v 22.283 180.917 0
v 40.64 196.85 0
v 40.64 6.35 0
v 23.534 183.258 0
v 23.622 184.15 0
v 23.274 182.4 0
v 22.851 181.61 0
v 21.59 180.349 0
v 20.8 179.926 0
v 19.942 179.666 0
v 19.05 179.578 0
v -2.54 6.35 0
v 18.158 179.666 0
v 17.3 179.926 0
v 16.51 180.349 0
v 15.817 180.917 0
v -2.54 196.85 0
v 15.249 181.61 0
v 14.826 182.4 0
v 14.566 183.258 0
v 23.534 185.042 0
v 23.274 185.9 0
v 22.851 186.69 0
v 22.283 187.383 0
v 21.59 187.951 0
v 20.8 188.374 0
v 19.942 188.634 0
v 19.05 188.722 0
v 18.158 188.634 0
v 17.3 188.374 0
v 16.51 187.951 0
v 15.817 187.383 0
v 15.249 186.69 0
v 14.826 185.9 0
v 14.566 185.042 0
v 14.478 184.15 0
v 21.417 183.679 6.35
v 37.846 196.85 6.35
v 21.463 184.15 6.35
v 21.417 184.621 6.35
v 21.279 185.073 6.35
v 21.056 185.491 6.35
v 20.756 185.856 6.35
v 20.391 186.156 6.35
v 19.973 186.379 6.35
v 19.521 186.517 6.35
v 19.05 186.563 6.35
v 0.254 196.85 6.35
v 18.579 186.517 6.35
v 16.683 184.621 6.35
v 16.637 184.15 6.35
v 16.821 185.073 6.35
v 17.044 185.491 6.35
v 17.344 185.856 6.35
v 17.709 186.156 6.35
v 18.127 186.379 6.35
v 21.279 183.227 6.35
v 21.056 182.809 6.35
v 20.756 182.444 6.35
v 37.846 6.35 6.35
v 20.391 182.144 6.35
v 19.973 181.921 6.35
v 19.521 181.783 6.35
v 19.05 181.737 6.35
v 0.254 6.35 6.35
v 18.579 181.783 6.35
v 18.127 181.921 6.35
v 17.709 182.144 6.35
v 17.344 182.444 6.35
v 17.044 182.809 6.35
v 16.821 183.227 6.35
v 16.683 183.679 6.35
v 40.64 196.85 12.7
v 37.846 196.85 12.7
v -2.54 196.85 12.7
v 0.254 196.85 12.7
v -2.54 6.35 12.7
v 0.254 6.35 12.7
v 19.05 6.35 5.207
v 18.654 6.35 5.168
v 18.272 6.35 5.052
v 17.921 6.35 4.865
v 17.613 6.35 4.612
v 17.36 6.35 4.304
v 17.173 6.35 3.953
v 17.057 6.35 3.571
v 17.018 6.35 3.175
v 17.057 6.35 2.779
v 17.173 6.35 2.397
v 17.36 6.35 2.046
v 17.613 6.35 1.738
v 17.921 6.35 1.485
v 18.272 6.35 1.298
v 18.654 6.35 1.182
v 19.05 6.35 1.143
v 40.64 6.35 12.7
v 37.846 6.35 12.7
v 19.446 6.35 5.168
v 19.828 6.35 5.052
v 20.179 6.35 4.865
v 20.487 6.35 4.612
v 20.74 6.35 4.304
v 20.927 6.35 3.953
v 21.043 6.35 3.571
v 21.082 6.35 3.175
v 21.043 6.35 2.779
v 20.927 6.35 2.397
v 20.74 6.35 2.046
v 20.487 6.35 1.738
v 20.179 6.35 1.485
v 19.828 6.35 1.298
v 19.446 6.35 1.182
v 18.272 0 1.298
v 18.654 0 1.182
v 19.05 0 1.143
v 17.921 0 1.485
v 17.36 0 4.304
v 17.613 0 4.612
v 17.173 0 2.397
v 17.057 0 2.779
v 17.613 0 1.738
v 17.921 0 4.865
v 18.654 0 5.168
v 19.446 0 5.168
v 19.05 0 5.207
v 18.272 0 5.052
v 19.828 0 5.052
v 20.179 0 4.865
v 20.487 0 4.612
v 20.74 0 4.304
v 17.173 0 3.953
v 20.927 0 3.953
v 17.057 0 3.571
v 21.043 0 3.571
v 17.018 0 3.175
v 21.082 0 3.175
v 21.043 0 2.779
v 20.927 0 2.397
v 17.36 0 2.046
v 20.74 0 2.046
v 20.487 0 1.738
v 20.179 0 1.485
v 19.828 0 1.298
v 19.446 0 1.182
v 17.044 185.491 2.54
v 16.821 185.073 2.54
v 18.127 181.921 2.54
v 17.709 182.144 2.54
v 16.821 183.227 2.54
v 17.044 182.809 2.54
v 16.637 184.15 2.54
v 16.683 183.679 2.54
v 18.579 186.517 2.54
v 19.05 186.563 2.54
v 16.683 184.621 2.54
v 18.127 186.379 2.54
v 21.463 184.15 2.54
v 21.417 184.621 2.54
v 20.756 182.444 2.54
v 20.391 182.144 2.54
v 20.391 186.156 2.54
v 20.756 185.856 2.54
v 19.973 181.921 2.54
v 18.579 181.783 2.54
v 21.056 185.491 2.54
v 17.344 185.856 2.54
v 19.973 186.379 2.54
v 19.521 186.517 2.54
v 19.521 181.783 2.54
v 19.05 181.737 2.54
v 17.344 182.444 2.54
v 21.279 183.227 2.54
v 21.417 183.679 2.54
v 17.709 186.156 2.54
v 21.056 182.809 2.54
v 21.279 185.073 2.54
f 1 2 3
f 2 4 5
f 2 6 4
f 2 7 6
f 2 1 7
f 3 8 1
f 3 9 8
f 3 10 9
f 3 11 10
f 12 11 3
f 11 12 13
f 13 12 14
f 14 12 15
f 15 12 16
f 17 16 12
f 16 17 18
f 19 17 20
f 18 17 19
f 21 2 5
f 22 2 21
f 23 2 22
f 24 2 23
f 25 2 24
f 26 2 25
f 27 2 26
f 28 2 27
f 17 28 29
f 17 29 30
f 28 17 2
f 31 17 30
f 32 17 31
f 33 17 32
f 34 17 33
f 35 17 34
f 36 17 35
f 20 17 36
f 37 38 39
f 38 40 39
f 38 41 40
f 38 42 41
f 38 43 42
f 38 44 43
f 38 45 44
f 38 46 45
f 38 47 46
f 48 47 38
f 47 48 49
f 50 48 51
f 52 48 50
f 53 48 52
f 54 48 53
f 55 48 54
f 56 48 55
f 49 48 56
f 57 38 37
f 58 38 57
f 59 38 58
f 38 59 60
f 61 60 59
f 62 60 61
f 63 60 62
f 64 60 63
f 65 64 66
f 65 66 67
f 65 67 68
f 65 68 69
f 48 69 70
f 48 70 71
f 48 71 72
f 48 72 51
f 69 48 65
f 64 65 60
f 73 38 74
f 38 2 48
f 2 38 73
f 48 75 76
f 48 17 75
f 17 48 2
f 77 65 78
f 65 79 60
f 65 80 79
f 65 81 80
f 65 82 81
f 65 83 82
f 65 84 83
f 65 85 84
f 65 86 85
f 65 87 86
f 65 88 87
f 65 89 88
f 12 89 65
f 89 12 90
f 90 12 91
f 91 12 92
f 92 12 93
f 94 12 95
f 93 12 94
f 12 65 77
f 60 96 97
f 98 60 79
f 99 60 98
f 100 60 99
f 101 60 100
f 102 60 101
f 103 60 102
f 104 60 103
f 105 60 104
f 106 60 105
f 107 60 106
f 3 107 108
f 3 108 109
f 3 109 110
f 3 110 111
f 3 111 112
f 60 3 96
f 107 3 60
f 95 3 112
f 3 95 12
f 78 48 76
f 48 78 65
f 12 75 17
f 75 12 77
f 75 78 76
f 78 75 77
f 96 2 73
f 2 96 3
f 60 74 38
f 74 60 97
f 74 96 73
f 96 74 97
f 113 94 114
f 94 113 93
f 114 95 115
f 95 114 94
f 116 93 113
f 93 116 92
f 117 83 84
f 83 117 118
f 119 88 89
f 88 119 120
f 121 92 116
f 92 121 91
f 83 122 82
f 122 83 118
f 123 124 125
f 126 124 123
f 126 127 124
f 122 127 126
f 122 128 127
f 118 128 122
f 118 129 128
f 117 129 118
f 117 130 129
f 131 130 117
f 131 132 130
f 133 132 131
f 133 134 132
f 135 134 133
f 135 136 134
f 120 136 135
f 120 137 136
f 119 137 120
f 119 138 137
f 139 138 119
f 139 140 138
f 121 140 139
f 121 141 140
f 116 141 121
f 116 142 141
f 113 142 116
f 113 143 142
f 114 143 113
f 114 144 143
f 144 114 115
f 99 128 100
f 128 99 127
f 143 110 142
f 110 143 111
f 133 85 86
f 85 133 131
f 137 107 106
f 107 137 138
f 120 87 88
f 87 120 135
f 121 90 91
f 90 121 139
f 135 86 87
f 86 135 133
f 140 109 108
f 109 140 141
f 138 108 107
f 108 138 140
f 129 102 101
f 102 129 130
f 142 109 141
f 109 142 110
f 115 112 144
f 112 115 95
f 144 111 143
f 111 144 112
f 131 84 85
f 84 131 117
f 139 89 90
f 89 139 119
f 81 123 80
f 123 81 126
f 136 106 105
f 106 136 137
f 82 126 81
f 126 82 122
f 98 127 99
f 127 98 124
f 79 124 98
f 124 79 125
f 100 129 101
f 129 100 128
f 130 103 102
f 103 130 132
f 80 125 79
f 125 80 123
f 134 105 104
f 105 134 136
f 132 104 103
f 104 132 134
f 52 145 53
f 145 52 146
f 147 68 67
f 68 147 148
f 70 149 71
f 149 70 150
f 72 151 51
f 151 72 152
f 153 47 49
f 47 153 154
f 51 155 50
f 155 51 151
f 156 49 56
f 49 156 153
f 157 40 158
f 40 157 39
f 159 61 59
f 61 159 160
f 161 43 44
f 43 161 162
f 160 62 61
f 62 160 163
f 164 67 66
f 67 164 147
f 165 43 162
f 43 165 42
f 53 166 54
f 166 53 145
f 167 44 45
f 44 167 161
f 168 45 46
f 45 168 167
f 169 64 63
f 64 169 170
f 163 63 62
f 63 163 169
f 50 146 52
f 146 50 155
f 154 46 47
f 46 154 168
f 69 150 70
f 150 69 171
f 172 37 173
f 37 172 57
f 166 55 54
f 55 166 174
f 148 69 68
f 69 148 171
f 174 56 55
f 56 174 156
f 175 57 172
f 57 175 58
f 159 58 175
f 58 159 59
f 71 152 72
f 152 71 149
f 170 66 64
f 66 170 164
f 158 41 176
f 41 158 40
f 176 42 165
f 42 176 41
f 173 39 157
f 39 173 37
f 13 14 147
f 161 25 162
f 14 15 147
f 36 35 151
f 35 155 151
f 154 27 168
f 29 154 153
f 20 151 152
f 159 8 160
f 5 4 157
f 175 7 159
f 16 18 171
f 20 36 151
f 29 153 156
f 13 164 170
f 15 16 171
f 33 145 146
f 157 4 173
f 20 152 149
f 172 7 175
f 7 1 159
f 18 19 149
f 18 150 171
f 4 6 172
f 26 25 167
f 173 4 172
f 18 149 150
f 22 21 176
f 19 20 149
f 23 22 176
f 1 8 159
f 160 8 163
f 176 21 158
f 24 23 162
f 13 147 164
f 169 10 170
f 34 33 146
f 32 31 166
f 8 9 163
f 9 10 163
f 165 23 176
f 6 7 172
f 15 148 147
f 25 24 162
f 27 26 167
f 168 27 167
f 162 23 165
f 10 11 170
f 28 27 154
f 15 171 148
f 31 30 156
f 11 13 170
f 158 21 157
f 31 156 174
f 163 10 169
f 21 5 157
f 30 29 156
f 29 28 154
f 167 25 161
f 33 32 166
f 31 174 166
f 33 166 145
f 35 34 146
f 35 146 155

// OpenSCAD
// file: _cat_door_u_liner_lib.scad
// Cat door U-shaped liner - shared geometry.
// Fits into a rectangular box cut into a door, lining the bottom and
// two sides with a thin wall so a smaller insert seats snugly in the gap.
//
// Flanges at the front and/or back cap the ends, sitting flush against
// the door's face and overlapping the cut edge to hide it.
//
// PRINTABILITY: a single piece with a 90-degree bend (leg+rail) can't be
// oriented to avoid supports, because the leg's flange overhang needs
// rotation about one axis while the rail's needs rotation about the other.
// So the part is split into 3 straight pieces - left leg, right leg, and
// the full-width bottom rail - each printable with zero overhangs, joined
// with a peg-and-hole press fit at the two corners. The rail (10.5in =
// 266.7mm) is also individually longer than a 256mm bed, so it's printed
// at a 45-degree diagonal, which brings its footprint to ~219x219mm.
//
// See cat_door_u_liner_leg_left.scad / _leg_right.scad / _rail.scad, which
// include this file and call the render_*() entry points. This file has no
// directly renderable geometry of its own (build_stl.py skips files
// starting with "_").

// ---- Parameters (inches) ----
door_depth      = 1.5;   // door thickness (liner spans this, Z)
box_width       = 10.5;  // width of the cutout in the door (X)
box_height      = 7.75;  // height of the cutout in the door (Y)
wall            = 0.25;  // thickness of the liner material (the gap it fills)

flange_front    = true;  // add a flange on the front face
flange_back     = true;  // add a flange on the back face
flange_overlap  = 0.25;  // how far the flange extends past the cut edge
flange_thick    = 0.1;   // flange thickness (Z), kept small/low-profile

screw_holes     = true;  // add mounting screw holes through the two legs
screw_hole_dia  = 0.19;  // clearance diameter for the screw shank (~#8 screw)
screw_hole_inset = 0.5;  // distance in from the tip (open end) of each leg

countersink       = true; // recess for a flat/flush screw head, on the inner face
countersink_dia   = 0.36; // head diameter (~#8 flat-head screw)
countersink_depth = 0.1;  // how deep the taper cuts into the leg (< wall)

// Corner joint: a round peg on each leg presses into a hole in the rail.
// The peg runs along the leg's own length, so it's a horizontal, in-plane
// extension of the print (no added overhang) rather than a feature that
// has to stick straight up off the bed. hole is slightly smaller than the
// peg for a firm friction/snap fit - sand the peg or reprint with
// adjusted diameters if it's too tight/loose.
joint_peg_dia   = 0.16;
joint_hole_dia  = 0.15;
joint_peg_height = 0.25;
joint_hole_depth = 0.32;

rail_print_angle = 45; // diagonal rotation so the rail fits a 256mm bed

eps = 0.01; // small overlap so parts fuse into one solid in unions

// ---- Shared sub-features ----

// Horizontal screw hole through one leg only (not the flange), so a screw
// bites into the solid door beside the cutout. Bored outward through the
// leg's outer face (x_start), centered on the leg's depth (Z), clear of
// the flanges which only occupy the ends of the Z range.
module screw_hole_leg(x_start, y_pos) {
    translate([x_start - eps, y_pos, door_depth / 2])
        rotate([0, 90, 0])
            cylinder(h = wall + 2 * eps, d = screw_hole_dia, $fn = 32);
}

// Countersink taper on the inner face (box-interior side) of a leg, where
// the screw head seats. dir = -1 for the left leg (inner face is the leg's
// high-x side, cone narrows toward -x); dir = +1 for the right leg (inner
// face is the low-x side, cone narrows toward +x).
module countersink_leg(x_face, y_pos, dir) {
    d1 = (dir < 0) ? screw_hole_dia : countersink_dia;
    d2 = (dir < 0) ? countersink_dia : screw_hole_dia;
    x0 = (dir < 0) ? x_face - countersink_depth : x_face;
    translate([x0, y_pos, door_depth / 2])
        rotate([0, 90, 0])
            cylinder(h = countersink_depth, d1 = d1, d2 = d2, $fn = 32);
}

// ---- Leg (a straight bar; the rail owns the corner squares, so a leg's
// own Y range starts at "wall", not 0) ----
// Built for the left side; the right leg is this shape mirrored about the
// box's centerline, which correctly flips the screw hole/countersink too.
module leg_shape(dir) {
    if (dir > 0) {
        translate([box_width, 0, 0]) mirror([1, 0, 0]) leg_shape(-1);
    } else {
        y0 = wall;
        y1 = box_height;
        h = y1 - y0;
        difference() {
            union() {
                translate([0, y0, 0]) cube([wall, h, door_depth]);
                if (flange_front)
                    translate([-flange_overlap, y0, -flange_thick])
                        cube([wall + flange_overlap, h, flange_thick + eps]);
                if (flange_back)
                    translate([-flange_overlap, y0, door_depth - eps])
                        cube([wall + flange_overlap, h, flange_thick + eps]);

                // Peg extending off the bottom face, into the rail's mortise
                translate([wall / 2, y0 - joint_peg_height, door_depth / 2])
                    rotate([-90, 0, 0])
                        cylinder(h = joint_peg_height + eps, d = joint_peg_dia, $fn = 32);
            }

            if (screw_holes) {
                y_pos = box_height - screw_hole_inset;
                screw_hole_leg(0, y_pos);
                if (countersink) countersink_leg(wall, y_pos, -1);
            }
        }
    }
}

// ---- Rail (full width; owns both bottom corner squares plus a mortise
// hole at each end that receives the matching leg's peg) ----
module rail_hole_at(x) {
    translate([x, wall - joint_hole_depth, door_depth / 2])
        rotate([-90, 0, 0])
            cylinder(h = joint_hole_depth + eps, d = joint_hole_dia, $fn = 32);
}

module rail_shape() {
    difference() {
        union() {
            cube([box_width, wall, door_depth]);
            if (flange_front)
                translate([-flange_overlap, -flange_overlap, -flange_thick])
                    cube([box_width + 2 * flange_overlap, wall + flange_overlap, flange_thick + eps]);
            if (flange_back)
                translate([-flange_overlap, -flange_overlap, door_depth - eps])
                    cube([box_width + 2 * flange_overlap, wall + flange_overlap, flange_thick + eps]);
        }

        rail_hole_at(wall / 2);
        rail_hole_at(box_width - wall / 2);
    }
}

// ---- Print-orientation wrappers ----
// Each piece is rotated so its "spine" (the inner face shared with the box
// opening) sits on the bed and the flange tips are at the top - going up,
// the cross-section only ever shrinks, so nothing overhangs and no
// supports are needed.
mm_per_inch = 25.4;

// The left and right legs are the same physical part: the flanges are
// front/back symmetric and the screw hole/countersink are centered on that
// same axis, so a 180-degree flip about the leg's own length swaps "left"
// for "right". One file, printed twice - flip one copy end-for-end when
// installing it on the other side of the door.
module render_leg() {
    scale([mm_per_inch, mm_per_inch, mm_per_inch])
        translate([0, 0, wall])
            rotate([0, 90, 0])
                leg_shape(-1);
}

module render_rail() {
    z_shift = wall;
    scale([mm_per_inch, mm_per_inch, mm_per_inch])
        rotate([0, 0, rail_print_angle])
            translate([0, 0, z_shift])
                rotate([-90, 0, 0])
                    rail_shape();
}
// main file
// One leg of the cat door U liner. Print this TWICE - the left and right
// legs are the same part; flip one copy end-for-end (180 degrees about its
// long axis) when installing it on the opposite side of the door.
// Pre-oriented for zero-overhang printing (spine on the bed, flange tips
// up) - just import and slice.
// See _cat_door_u_liner_lib.scad for parameters and the rail piece.
include <_cat_door_u_liner_lib.scad>
render_leg();
